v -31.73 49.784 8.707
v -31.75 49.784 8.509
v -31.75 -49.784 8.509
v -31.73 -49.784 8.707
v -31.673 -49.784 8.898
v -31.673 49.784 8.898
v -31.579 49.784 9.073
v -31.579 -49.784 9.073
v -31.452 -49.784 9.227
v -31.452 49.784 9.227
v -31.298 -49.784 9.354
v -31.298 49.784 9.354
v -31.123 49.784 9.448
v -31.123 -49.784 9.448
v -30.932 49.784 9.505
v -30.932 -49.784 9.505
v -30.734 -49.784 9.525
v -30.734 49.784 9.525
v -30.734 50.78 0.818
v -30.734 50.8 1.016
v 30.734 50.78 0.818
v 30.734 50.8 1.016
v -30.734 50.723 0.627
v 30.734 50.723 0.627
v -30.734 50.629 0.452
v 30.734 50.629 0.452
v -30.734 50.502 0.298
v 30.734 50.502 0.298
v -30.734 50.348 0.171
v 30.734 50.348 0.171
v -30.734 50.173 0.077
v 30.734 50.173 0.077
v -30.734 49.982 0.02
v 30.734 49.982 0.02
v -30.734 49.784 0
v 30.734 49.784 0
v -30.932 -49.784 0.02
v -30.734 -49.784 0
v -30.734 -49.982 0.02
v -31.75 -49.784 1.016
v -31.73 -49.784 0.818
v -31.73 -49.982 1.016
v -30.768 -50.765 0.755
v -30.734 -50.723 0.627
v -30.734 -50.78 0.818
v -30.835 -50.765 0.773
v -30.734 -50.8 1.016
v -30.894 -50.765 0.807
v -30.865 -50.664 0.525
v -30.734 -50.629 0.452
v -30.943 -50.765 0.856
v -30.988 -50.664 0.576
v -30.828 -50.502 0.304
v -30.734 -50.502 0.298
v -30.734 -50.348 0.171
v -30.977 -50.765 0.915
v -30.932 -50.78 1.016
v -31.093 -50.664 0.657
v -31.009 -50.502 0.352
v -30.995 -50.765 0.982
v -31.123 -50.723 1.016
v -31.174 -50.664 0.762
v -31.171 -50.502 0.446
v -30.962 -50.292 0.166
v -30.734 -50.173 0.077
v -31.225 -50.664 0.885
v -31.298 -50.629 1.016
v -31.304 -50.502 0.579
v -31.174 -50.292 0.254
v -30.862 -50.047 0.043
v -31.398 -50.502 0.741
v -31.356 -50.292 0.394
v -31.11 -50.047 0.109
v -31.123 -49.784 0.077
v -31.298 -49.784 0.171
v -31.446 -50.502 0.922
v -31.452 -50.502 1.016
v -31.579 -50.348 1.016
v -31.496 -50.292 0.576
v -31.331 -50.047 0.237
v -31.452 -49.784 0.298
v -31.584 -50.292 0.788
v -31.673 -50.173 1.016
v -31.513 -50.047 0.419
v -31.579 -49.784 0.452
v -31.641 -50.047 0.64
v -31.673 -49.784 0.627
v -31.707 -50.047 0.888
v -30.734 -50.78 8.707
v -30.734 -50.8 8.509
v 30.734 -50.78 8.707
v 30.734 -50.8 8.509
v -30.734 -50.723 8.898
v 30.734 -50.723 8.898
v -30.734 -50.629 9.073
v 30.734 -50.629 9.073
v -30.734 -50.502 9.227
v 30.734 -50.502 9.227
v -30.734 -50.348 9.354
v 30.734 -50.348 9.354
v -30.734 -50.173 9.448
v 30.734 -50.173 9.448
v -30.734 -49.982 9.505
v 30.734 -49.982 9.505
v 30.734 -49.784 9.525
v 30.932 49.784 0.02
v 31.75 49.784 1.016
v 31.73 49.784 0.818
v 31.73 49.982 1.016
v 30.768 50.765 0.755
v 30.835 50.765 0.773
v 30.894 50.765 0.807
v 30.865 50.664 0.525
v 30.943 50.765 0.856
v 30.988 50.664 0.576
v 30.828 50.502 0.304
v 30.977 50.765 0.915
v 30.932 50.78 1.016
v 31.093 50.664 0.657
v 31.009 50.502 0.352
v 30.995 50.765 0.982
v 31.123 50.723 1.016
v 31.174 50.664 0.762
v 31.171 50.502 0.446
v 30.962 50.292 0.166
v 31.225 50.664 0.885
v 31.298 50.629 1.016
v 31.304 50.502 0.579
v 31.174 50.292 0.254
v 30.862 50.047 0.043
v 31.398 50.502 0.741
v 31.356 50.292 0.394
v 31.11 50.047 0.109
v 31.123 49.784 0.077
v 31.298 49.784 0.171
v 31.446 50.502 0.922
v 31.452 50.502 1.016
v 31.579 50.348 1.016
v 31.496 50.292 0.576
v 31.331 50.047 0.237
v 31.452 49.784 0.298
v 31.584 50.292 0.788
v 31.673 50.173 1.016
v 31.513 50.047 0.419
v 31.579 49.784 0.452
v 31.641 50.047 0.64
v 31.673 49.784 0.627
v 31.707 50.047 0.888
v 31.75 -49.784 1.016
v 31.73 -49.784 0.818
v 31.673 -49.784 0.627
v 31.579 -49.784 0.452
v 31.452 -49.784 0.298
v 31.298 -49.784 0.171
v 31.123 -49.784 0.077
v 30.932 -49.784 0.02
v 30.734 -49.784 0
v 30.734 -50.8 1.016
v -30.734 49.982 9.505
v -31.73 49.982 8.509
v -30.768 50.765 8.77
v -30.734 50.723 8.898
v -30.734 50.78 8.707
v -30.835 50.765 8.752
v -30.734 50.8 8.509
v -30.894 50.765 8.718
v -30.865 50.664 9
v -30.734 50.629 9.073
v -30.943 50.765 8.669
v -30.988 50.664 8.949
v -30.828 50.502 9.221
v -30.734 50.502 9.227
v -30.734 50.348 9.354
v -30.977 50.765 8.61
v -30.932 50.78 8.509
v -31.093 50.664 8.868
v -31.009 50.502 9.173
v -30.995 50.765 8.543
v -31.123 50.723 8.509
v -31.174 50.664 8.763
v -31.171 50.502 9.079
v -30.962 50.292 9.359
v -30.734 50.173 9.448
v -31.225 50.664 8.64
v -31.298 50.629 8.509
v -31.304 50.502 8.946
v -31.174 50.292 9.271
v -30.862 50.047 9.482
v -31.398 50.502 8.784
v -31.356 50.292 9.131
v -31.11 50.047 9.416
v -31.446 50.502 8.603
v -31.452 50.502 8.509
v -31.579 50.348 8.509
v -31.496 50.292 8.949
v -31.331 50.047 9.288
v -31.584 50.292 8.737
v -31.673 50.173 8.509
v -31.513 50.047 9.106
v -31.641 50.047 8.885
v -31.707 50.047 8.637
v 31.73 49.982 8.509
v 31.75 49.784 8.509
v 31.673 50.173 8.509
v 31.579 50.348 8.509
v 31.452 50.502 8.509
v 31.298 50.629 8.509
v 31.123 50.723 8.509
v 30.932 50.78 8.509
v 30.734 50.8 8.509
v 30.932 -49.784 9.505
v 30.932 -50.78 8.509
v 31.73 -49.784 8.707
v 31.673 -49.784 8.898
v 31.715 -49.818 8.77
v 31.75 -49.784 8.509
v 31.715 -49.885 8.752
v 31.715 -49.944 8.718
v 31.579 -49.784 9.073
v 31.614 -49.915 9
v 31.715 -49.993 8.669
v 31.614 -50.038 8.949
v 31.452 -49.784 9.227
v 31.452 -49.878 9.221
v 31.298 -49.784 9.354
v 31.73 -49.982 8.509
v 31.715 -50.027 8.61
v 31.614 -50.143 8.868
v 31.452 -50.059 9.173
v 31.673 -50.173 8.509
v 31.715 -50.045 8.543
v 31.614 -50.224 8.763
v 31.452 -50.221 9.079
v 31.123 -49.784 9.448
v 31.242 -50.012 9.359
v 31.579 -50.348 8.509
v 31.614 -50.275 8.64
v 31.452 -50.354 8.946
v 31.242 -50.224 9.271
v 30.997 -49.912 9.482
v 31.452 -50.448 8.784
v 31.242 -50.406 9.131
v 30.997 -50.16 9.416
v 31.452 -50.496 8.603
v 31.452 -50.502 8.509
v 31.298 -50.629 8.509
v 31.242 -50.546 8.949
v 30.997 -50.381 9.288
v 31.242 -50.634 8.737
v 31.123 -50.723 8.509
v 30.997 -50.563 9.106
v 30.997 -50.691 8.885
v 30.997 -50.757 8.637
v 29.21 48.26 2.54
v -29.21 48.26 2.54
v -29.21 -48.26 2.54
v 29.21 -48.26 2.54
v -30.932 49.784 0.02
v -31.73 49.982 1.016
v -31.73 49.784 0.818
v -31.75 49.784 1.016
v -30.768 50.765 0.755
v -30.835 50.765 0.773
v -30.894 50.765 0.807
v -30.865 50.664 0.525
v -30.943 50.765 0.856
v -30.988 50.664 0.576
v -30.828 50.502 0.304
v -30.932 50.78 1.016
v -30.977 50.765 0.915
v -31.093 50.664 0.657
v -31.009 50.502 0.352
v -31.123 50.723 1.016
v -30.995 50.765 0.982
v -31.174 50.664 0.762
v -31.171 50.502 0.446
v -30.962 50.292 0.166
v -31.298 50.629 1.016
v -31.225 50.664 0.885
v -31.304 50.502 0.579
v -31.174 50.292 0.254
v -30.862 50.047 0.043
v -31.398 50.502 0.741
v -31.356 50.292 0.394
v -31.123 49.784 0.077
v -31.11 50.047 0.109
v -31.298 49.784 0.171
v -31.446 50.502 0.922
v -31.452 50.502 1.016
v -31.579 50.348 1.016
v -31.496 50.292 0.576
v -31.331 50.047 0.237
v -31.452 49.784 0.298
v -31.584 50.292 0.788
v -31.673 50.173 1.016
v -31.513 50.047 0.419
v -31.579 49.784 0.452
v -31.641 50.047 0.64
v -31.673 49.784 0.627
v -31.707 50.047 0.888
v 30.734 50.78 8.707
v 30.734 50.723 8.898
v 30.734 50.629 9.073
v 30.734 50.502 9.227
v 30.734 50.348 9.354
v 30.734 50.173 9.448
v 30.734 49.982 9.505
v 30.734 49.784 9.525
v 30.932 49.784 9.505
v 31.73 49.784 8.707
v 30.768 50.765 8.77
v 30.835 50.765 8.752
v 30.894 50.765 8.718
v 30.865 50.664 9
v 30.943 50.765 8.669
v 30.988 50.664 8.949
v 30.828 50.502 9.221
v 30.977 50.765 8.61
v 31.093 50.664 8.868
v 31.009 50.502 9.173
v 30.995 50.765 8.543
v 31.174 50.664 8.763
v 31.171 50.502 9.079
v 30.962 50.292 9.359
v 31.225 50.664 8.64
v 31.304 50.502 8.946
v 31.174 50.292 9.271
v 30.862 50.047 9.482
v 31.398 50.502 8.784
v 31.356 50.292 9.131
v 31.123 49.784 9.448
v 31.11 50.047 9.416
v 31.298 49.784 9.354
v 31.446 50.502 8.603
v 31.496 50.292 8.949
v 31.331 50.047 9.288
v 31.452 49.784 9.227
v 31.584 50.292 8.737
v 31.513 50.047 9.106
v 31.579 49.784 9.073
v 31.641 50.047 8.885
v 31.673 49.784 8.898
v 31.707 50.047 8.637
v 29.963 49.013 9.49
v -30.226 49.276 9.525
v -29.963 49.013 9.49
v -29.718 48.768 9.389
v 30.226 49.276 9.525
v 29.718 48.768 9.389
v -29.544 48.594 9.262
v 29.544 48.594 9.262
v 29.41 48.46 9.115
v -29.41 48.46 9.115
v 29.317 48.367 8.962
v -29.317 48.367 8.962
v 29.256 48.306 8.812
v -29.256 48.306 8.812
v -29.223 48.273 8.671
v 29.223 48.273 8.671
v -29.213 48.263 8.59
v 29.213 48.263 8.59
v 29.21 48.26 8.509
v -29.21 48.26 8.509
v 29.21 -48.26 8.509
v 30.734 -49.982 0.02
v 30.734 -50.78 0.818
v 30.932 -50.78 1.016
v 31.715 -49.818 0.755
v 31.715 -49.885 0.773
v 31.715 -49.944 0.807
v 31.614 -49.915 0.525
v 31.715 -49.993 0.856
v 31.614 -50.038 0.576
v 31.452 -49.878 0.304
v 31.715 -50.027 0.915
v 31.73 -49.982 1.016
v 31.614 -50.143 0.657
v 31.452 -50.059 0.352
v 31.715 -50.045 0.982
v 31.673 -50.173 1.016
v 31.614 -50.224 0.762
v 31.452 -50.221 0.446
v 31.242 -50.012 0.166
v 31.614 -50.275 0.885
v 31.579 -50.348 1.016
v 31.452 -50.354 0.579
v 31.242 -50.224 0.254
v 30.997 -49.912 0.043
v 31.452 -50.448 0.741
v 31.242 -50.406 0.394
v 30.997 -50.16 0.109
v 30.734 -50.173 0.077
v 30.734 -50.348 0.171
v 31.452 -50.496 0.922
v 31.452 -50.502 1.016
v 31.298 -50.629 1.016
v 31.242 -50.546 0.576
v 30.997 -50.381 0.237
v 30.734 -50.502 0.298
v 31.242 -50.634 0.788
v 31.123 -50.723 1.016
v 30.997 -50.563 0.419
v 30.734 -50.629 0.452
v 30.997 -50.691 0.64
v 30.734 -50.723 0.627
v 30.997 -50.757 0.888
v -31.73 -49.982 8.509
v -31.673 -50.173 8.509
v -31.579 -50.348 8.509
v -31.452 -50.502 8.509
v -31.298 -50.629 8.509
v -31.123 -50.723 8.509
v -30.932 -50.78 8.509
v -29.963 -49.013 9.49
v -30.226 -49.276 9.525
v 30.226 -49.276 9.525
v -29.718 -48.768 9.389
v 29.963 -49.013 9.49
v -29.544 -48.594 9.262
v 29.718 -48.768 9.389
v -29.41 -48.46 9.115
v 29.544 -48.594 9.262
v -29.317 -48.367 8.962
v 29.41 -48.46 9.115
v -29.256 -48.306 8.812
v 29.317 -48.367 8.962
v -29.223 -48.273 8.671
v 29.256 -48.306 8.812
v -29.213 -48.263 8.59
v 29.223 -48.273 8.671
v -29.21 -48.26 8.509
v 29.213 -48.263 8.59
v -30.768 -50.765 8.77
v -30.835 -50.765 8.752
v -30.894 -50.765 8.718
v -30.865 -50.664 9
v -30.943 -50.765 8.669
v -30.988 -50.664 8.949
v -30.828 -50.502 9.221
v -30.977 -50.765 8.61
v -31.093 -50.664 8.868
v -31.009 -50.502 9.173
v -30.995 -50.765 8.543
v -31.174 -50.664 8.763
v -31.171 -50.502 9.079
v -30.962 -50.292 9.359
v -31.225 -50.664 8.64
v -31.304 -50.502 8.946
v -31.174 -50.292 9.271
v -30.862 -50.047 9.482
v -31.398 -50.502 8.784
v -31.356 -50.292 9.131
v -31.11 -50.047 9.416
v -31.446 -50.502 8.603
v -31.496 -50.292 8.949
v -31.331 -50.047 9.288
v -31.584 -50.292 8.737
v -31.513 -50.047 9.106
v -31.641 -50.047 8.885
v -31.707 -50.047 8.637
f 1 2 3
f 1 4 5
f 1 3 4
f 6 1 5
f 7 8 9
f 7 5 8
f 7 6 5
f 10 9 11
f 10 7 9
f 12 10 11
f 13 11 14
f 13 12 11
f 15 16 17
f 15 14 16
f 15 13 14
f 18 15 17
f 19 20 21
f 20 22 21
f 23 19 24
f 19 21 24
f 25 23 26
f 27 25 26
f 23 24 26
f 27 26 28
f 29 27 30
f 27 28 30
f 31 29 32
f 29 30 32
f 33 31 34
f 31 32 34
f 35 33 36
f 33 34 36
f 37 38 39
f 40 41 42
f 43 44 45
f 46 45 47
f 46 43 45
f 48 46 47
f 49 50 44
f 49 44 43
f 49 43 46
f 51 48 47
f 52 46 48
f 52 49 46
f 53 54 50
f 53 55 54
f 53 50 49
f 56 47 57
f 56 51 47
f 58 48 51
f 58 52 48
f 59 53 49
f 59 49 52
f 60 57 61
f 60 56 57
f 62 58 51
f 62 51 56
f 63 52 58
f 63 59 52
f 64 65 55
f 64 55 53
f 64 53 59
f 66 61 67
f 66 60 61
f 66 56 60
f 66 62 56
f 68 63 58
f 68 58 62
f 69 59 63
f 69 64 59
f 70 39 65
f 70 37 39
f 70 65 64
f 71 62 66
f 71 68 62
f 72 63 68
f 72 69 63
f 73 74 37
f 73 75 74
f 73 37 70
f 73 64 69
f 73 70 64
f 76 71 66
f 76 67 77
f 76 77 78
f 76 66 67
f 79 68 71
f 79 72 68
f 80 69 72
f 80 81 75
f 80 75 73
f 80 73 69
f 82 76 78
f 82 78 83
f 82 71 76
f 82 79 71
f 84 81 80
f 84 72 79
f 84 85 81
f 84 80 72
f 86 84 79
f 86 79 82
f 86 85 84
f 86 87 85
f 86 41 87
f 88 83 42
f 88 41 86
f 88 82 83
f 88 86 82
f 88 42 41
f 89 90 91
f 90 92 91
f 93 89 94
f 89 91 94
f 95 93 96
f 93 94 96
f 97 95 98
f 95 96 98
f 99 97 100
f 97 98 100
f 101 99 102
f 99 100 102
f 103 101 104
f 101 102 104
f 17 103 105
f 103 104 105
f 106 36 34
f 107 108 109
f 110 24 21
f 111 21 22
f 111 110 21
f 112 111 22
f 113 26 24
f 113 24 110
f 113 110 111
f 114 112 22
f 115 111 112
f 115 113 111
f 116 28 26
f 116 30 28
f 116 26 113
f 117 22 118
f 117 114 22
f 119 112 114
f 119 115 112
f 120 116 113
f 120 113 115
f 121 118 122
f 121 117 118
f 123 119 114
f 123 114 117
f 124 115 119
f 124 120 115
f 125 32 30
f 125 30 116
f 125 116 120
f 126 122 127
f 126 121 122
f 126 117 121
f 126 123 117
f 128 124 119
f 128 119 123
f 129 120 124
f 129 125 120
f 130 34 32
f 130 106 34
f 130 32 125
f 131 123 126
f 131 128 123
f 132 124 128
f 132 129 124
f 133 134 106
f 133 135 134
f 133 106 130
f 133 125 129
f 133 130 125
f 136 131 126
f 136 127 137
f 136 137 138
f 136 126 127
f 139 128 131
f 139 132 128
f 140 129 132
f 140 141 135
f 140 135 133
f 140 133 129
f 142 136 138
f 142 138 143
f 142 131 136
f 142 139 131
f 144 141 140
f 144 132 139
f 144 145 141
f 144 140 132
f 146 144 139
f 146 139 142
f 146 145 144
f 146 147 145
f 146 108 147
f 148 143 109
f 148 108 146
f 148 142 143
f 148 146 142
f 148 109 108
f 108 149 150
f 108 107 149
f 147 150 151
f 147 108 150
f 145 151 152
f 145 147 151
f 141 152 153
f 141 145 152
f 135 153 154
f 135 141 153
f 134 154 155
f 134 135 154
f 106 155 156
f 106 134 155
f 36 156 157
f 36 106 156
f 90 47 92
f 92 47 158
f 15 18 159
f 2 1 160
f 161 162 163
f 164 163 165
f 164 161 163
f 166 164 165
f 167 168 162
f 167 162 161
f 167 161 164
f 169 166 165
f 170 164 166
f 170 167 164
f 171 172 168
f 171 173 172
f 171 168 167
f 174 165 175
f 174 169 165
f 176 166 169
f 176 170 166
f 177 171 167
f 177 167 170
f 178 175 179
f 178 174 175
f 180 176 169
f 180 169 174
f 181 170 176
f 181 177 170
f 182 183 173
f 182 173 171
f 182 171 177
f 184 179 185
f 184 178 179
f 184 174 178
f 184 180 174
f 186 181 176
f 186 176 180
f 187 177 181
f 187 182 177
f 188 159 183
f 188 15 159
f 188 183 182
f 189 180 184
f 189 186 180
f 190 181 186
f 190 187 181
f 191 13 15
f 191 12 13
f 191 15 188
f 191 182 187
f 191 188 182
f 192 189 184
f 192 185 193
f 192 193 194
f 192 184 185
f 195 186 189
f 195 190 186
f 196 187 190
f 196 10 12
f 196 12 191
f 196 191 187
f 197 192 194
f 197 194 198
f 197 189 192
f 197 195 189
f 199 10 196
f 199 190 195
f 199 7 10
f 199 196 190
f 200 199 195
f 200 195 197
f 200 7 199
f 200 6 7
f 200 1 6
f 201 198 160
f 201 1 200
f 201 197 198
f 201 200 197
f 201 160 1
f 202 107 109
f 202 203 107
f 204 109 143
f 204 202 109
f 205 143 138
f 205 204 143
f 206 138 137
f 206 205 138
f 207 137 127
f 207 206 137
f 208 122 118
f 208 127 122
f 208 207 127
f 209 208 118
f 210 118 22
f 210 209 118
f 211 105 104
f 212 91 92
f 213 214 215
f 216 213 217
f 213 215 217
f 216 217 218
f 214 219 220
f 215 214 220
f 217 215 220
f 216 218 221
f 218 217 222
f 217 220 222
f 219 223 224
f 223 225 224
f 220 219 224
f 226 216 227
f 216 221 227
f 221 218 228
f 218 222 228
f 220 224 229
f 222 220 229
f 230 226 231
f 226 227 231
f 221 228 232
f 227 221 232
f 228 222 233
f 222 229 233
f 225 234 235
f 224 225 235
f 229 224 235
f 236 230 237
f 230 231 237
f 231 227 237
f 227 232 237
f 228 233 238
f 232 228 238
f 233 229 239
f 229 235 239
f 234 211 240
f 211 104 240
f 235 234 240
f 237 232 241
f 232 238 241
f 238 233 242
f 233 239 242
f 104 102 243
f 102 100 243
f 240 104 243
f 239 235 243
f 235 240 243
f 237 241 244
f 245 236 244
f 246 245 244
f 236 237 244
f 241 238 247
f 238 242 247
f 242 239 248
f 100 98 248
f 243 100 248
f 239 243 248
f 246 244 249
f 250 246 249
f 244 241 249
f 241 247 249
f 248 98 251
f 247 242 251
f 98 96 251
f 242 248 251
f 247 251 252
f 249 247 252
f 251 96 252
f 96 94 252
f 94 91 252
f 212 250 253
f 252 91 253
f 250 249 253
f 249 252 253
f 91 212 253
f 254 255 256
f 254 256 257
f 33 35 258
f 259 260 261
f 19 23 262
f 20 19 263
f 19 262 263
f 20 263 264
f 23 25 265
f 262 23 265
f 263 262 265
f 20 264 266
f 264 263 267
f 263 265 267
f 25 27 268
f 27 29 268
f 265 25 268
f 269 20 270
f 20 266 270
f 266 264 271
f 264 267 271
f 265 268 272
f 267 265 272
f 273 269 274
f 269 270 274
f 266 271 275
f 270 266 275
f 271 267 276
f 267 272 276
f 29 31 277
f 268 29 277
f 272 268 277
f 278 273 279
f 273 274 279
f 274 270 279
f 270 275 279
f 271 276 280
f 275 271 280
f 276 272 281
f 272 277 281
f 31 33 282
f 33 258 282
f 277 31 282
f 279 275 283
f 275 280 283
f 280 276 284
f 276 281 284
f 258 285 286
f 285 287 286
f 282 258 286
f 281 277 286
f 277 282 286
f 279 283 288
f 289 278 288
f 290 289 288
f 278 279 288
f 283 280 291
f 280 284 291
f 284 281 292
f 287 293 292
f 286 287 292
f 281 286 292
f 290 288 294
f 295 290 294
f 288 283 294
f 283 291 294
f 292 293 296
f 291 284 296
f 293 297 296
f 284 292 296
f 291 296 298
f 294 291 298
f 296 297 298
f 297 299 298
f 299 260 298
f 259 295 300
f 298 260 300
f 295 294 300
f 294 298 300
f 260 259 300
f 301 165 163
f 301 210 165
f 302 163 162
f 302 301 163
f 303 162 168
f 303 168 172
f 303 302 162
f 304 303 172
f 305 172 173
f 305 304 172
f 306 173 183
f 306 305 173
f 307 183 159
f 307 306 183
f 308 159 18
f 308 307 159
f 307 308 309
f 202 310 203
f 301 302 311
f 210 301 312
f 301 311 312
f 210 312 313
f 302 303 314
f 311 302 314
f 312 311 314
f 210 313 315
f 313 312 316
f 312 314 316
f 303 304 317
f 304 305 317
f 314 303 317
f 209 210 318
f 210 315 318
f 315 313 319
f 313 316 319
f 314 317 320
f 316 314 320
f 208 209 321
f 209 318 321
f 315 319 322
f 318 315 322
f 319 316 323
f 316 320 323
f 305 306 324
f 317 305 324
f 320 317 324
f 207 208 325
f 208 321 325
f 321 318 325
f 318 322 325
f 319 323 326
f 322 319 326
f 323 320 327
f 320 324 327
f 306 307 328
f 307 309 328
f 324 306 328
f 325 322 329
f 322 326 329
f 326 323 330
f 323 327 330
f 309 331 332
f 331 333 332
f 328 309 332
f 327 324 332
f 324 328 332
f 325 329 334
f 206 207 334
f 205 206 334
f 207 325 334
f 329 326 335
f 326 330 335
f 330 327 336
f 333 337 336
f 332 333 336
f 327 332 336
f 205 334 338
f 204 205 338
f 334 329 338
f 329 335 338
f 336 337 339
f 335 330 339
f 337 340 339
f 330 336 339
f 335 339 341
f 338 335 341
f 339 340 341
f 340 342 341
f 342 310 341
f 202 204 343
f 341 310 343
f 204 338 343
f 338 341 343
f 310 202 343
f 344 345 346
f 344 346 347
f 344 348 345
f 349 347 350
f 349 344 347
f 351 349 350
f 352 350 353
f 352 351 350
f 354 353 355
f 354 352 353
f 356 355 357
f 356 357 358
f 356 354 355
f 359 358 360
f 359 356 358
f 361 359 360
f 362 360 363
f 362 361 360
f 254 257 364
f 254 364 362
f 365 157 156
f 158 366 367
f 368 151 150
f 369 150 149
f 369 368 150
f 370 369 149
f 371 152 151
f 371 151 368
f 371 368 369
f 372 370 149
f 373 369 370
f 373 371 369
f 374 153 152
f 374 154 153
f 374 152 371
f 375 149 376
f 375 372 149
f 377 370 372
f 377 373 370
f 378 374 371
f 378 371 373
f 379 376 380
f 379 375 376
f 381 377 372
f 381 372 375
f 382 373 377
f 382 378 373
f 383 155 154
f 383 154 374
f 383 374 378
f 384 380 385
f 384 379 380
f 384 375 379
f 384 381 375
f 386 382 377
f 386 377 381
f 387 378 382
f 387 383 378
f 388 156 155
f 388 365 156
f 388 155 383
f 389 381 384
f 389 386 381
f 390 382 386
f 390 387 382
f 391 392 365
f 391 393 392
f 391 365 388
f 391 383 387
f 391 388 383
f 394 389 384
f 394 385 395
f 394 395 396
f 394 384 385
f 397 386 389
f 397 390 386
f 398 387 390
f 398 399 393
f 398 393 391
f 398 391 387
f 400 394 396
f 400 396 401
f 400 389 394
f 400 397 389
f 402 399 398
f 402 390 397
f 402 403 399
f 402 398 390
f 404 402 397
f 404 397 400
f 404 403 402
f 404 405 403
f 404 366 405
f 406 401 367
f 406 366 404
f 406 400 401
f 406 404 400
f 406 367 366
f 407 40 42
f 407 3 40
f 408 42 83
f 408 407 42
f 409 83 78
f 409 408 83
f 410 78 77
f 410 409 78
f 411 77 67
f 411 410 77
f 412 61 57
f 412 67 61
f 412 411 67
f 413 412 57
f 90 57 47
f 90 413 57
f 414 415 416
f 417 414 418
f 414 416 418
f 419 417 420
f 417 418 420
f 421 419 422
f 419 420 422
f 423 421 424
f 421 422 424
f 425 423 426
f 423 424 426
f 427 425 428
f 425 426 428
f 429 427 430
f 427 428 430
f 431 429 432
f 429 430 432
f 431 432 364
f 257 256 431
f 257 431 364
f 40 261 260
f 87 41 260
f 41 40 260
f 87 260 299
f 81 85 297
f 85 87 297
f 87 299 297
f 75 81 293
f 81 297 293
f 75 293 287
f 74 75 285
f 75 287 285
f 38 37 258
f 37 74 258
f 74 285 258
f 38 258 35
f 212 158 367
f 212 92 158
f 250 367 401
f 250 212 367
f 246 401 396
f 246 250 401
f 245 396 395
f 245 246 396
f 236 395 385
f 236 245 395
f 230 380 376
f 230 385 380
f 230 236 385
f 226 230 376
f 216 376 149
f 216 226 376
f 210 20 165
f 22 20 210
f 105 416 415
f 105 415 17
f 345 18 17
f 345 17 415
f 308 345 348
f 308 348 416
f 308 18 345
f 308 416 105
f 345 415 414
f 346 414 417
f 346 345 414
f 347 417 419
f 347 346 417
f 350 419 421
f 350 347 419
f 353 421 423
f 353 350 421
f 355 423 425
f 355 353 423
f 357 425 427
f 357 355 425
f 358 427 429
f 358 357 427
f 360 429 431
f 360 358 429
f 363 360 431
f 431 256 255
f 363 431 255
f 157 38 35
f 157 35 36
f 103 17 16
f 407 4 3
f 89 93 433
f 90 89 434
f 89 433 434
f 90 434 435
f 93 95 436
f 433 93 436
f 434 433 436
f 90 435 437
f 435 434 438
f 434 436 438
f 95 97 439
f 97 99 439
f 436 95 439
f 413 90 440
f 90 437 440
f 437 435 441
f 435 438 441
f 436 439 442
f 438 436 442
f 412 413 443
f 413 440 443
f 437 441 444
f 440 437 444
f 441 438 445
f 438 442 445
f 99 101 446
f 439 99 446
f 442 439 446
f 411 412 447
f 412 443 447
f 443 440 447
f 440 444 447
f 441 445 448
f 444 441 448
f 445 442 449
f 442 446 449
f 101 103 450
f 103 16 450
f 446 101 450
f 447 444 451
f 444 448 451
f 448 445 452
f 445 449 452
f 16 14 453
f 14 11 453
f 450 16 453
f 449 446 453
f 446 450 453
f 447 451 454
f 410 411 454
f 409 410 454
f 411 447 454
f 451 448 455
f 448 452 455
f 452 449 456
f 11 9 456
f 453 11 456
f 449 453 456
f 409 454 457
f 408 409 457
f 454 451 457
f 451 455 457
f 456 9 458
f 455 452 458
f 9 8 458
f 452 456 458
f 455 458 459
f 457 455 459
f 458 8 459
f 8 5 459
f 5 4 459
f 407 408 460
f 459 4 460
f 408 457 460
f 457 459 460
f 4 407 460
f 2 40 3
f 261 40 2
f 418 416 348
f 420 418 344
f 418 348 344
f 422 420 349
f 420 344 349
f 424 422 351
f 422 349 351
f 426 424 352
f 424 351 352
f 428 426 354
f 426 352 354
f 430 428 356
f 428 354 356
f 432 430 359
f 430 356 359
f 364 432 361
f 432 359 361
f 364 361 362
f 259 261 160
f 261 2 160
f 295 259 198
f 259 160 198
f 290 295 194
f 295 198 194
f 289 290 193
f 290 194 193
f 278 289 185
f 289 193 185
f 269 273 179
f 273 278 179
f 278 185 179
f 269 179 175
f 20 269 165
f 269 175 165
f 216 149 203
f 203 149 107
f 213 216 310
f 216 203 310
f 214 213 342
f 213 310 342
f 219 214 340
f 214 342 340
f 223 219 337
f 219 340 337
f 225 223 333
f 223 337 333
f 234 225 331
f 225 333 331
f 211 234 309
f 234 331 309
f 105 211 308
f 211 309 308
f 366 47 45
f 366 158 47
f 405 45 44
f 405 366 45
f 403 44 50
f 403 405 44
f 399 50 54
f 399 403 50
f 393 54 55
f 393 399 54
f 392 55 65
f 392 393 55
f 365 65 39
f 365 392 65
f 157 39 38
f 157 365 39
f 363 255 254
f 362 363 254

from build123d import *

# Parameters (mm, degrees)
F0_W     = 63.5
F0_H     = 101.6
F1_DEPTH = 9.525
F2_T     = -2.54
F3_R     = 1.016


with BuildPart() as f1:
    # F0 (on Top) → F1 (new body)
    with BuildSketch(Plane.XY):
        Rectangle(F0_W, F0_H)
    extrude(amount=F1_DEPTH)

    # F2
    f2_openings = [f1.faces().sort_by_distance(p)[0] for p in [
        (0, 0, 9.525),
    ]]
    offset(amount=F2_T, openings=f2_openings)

    # F3
    f3_edges = [f1.edges().sort_by_distance(p)[0] for p in [
        (-31.75, 0, 0),
        (0, -50.8, 0),
        (31.75, 0, 0),
        (0, 50.8, 0),
        (-31.75, 0, 9.525),
        (0, -50.8, 9.525),
        (31.75, 0, 9.525),
        (0, 50.8, 9.525),
        (-29.21, 0, 9.525),
        (0, 48.26, 9.525),
        (29.21, 0, 9.525),
        (0, -48.26, 9.525),
        (-31.75, 50.8, 4.7625),
        (-31.75, -50.8, 4.7625),
        (31.75, 50.8, 4.7625),
        (31.75, -50.8, 4.7625),
    ]]
    fillet(f3_edges, radius=F3_R)


solid = f1.part
